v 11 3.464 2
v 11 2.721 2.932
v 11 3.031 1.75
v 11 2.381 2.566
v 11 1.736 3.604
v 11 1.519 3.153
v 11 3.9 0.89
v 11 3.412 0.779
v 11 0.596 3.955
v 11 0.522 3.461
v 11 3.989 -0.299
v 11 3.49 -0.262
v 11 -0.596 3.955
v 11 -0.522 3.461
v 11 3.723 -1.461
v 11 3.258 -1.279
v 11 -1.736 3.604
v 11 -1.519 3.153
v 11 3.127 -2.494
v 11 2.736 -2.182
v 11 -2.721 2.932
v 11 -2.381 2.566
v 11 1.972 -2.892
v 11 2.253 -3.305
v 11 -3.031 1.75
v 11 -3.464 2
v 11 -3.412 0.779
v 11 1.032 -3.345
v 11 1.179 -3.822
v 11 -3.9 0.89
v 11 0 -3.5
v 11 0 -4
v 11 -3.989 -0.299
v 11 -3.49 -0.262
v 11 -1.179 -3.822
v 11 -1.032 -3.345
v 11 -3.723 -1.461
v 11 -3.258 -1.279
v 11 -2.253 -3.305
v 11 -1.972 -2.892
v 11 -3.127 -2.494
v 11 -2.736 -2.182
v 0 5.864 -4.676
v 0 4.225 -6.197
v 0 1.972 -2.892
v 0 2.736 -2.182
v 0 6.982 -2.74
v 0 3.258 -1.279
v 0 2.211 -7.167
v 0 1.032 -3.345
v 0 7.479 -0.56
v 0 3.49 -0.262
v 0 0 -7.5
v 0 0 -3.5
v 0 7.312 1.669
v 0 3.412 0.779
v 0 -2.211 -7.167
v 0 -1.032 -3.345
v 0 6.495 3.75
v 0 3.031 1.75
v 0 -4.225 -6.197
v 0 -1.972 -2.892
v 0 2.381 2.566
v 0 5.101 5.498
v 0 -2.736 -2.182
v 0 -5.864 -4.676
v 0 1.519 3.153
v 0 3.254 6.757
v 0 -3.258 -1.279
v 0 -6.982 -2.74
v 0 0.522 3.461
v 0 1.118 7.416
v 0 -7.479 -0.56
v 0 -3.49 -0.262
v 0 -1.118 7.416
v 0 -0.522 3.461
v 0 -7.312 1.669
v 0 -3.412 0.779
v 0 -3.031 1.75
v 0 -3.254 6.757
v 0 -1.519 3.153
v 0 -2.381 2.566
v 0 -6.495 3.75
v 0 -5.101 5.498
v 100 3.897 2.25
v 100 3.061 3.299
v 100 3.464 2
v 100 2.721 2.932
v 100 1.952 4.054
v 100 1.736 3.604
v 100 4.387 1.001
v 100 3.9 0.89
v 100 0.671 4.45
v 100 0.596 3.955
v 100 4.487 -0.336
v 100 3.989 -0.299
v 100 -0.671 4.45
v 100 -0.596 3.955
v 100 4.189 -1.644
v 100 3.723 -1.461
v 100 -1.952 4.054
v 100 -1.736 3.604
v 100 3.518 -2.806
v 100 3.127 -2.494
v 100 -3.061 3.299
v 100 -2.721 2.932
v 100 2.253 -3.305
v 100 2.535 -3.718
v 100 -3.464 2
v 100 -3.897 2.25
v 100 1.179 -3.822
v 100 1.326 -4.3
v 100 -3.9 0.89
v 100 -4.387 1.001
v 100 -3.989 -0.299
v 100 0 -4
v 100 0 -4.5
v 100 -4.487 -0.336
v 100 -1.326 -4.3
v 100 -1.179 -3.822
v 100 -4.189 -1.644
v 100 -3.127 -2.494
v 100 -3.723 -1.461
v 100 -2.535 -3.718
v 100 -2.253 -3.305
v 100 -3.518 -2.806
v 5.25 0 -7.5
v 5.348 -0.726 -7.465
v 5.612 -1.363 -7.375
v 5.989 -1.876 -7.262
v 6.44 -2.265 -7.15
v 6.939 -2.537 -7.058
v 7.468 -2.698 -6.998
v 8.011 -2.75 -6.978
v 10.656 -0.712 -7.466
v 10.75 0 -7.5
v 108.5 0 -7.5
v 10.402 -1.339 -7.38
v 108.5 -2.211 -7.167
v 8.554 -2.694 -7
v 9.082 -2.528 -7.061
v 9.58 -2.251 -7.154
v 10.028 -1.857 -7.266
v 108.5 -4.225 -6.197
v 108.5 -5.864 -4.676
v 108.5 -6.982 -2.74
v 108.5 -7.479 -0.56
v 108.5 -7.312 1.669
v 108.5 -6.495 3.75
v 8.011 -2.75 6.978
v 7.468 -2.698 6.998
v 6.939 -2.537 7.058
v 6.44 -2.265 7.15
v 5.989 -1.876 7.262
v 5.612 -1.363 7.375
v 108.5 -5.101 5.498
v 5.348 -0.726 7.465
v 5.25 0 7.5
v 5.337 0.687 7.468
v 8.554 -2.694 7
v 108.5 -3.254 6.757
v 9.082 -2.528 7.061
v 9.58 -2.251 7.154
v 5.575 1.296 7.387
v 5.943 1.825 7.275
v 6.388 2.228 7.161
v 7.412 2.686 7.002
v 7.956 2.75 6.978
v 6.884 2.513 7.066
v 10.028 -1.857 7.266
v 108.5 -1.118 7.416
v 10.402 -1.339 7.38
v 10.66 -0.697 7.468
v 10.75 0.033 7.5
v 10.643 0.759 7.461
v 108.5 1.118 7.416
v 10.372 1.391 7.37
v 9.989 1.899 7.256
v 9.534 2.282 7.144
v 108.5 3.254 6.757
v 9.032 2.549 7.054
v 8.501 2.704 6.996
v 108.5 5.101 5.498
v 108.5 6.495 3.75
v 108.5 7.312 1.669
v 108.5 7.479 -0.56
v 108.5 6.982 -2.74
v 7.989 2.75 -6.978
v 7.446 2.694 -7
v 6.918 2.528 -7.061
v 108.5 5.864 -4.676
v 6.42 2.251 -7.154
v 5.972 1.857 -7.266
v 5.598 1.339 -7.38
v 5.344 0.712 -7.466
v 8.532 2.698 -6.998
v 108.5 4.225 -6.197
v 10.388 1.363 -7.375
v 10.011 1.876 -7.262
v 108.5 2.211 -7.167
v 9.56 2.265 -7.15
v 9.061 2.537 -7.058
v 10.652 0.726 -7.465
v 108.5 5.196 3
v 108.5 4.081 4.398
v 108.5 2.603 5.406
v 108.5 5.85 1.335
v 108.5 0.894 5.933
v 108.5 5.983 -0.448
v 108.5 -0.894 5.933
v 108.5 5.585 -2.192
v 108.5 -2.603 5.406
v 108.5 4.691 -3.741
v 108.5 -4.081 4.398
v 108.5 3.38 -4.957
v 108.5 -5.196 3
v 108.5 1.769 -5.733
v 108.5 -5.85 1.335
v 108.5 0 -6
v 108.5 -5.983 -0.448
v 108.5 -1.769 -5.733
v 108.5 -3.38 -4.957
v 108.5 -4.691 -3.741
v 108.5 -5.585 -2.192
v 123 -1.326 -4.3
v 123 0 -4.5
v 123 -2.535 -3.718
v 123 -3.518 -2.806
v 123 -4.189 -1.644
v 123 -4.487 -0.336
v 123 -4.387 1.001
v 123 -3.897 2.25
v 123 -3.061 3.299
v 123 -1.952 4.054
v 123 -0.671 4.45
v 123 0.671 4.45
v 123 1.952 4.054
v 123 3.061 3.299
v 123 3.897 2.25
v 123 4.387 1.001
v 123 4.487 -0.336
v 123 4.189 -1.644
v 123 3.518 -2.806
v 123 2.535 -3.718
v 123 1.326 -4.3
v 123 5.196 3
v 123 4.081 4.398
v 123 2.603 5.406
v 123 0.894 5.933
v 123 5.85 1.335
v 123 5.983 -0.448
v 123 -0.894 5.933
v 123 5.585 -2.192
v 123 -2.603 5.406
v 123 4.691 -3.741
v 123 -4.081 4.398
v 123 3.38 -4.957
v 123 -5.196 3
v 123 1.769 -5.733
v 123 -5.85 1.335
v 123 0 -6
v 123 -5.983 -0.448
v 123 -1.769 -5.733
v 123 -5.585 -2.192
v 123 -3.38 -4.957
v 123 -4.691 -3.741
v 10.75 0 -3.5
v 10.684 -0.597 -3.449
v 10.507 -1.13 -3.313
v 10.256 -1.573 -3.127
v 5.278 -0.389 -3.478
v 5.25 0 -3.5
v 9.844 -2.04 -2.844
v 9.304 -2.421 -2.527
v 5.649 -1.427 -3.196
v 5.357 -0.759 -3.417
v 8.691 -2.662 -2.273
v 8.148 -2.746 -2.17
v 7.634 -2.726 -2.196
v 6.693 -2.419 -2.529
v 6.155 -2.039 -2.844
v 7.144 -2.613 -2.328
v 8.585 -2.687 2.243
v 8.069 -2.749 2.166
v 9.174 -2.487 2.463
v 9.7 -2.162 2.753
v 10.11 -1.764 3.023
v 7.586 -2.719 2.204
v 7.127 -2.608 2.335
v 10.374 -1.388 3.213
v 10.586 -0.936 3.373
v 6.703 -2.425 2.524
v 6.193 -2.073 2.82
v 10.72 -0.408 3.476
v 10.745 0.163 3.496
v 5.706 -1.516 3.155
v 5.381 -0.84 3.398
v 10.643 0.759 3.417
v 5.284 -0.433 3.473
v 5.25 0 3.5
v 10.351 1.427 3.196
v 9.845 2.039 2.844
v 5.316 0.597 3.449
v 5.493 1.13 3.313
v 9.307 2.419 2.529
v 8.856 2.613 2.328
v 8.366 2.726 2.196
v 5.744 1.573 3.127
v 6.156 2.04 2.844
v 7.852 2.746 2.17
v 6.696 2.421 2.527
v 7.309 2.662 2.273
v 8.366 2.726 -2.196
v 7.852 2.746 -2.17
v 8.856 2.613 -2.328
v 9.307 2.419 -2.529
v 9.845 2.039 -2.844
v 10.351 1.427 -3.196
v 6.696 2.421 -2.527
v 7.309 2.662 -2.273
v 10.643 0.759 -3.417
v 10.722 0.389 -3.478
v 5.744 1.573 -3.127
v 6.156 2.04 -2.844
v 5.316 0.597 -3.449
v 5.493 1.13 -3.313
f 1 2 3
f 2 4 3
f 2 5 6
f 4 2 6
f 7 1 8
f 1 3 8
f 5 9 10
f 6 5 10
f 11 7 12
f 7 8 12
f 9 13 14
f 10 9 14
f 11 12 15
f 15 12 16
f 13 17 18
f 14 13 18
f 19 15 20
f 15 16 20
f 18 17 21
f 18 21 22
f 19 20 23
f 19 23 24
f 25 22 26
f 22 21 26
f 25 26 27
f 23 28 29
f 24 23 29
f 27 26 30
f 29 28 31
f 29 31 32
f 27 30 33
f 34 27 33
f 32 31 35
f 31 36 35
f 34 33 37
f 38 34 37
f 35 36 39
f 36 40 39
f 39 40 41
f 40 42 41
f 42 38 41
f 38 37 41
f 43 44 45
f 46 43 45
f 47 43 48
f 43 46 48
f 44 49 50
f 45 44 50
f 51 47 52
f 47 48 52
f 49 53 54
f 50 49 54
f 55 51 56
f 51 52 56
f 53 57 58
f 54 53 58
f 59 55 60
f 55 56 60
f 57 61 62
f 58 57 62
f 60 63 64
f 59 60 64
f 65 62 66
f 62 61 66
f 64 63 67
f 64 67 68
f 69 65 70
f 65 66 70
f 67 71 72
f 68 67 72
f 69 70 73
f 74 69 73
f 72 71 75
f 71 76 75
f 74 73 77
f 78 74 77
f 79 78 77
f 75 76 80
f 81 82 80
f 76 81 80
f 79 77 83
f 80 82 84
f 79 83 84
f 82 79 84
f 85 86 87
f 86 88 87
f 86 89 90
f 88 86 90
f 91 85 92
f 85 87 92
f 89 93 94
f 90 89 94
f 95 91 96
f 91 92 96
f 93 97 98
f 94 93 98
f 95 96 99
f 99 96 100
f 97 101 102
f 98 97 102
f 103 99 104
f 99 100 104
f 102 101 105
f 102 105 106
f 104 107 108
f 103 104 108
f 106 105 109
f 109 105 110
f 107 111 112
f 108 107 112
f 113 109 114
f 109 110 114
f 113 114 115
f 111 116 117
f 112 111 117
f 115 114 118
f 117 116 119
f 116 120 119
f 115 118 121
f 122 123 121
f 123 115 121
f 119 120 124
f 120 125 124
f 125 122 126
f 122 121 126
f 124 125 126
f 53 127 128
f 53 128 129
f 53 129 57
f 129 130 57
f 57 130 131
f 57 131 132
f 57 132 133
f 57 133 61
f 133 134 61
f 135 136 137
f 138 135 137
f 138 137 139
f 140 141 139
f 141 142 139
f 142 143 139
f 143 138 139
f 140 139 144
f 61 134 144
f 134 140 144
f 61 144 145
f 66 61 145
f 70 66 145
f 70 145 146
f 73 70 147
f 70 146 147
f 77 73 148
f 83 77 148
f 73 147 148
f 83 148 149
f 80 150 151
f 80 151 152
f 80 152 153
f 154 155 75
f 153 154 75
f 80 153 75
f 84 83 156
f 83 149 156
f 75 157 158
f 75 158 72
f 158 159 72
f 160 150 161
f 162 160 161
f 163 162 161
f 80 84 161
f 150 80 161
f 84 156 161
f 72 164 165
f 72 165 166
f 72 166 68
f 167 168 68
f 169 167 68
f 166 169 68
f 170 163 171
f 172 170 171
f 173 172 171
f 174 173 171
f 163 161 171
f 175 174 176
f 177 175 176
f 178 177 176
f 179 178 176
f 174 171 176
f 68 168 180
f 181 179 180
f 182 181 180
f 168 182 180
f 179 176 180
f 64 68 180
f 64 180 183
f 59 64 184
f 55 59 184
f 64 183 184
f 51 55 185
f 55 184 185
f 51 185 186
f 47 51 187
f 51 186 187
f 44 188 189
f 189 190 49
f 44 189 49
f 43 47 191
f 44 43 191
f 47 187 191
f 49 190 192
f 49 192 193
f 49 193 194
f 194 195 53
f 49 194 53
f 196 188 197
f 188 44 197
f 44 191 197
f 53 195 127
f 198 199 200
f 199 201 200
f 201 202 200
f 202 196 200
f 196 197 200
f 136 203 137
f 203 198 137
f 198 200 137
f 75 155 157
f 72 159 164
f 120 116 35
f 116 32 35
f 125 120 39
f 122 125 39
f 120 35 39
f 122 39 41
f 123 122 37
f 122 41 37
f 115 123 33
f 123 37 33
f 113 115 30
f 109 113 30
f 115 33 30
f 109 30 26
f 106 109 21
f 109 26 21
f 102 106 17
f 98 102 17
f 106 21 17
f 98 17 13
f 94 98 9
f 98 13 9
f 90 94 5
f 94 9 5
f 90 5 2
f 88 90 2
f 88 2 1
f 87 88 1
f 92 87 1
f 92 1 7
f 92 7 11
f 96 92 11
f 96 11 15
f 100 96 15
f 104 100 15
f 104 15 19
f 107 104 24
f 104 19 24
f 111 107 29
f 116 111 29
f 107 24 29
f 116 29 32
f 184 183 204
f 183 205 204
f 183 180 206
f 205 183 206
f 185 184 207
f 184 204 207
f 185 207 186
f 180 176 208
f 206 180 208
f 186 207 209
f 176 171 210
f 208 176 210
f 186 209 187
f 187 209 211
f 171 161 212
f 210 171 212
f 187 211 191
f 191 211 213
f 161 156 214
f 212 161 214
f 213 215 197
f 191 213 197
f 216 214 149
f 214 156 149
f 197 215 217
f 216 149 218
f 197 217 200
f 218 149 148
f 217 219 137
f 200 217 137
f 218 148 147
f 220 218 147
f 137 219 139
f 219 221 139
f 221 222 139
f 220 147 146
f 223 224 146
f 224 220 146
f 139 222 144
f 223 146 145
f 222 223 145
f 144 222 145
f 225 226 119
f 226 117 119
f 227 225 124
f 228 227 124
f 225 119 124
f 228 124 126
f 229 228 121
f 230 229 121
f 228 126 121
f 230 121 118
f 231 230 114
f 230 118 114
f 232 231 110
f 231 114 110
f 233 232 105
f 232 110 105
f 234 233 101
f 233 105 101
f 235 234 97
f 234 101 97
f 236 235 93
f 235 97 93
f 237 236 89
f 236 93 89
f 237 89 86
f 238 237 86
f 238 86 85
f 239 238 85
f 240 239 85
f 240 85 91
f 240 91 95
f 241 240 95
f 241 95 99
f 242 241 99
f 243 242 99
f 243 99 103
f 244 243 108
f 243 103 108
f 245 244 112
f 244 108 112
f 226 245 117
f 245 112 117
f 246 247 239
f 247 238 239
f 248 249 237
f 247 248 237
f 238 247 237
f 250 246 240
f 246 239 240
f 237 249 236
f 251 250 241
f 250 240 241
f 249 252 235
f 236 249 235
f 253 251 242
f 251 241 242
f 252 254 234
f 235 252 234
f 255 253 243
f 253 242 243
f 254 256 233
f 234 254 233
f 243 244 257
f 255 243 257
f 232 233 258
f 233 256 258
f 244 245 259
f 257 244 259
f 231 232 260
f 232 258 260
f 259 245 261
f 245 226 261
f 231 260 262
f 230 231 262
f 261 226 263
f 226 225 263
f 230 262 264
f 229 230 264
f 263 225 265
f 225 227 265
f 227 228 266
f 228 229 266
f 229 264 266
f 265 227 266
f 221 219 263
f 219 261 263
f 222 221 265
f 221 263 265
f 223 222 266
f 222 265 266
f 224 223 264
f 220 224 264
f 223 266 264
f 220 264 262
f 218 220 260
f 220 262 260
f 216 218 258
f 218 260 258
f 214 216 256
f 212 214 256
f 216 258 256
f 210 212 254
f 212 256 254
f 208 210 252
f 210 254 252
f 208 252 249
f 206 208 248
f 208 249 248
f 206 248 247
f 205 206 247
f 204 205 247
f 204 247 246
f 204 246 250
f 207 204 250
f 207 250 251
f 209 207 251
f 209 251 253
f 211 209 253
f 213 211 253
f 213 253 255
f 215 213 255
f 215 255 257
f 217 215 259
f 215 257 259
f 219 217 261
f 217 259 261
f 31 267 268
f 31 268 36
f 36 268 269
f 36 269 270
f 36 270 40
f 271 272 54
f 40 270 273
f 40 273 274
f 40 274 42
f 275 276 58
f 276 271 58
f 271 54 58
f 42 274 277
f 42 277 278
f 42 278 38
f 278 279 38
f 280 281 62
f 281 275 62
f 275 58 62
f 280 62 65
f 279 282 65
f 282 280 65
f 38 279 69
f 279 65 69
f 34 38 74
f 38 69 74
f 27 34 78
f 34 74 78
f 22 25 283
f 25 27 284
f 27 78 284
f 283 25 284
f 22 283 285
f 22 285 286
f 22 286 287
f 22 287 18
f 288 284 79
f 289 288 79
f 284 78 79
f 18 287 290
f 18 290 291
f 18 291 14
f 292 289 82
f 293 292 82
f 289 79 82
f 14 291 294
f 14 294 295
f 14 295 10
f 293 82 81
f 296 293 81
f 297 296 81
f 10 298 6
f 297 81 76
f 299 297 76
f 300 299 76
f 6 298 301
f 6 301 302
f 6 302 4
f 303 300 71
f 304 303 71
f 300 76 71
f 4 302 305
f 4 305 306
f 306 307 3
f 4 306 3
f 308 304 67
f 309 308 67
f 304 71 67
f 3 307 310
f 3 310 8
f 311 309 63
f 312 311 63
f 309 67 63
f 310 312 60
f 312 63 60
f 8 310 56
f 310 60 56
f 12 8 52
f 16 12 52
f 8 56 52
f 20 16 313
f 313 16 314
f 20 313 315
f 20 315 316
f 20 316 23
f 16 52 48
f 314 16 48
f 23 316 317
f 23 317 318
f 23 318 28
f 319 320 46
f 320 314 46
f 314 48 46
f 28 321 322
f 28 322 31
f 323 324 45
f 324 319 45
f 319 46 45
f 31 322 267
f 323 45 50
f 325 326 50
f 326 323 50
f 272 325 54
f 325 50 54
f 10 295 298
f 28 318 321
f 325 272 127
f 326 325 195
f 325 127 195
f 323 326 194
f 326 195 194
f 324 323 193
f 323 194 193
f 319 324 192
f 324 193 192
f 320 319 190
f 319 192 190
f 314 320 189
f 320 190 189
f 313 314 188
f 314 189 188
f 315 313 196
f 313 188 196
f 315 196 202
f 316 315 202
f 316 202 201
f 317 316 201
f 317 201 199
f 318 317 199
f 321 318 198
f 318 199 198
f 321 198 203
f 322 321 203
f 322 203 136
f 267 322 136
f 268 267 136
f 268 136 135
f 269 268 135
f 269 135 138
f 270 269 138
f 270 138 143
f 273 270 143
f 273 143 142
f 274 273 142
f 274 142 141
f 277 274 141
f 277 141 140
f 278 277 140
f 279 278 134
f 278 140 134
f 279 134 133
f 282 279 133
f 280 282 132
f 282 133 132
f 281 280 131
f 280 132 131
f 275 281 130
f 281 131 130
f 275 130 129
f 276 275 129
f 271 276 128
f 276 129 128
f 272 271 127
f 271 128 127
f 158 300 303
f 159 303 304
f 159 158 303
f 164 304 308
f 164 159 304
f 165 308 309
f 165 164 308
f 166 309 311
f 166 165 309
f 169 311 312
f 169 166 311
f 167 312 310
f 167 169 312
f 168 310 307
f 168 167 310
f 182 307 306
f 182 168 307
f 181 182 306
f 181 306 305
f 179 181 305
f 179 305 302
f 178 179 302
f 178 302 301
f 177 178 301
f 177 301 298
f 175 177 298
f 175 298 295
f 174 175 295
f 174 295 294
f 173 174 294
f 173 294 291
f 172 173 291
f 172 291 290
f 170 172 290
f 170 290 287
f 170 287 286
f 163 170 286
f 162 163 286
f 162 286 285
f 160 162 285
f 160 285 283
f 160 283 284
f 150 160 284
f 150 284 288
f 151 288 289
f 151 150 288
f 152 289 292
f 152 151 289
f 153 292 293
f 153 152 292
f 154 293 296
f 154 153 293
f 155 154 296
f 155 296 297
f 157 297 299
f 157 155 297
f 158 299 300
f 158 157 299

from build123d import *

# Parameters (mm, degrees)
FURO_DE_DI_METRO_5_5_5_5_1_REACH  = 126.138
FURO_DE_DI_METRO_5_5_5_5_1_BORE_R = 2.75


with BuildPart() as part:
    # Esboço1 → Revolução1 (revolve)
    with BuildSketch(Plane.XY, mode=Mode.PRIVATE) as revolu_o1_sk:
        Polygon((0, 3.5), (0, 7.5), (108.5, 7.5), (108.5, 6), (123, 6), (123, 4.5), (100, 4.5), (100, 4), (11, 4), (11, 3.5), align=None)
    revolve(revolu_o1_sk.sketch.rotate(Axis((123, 0, 0), (-1, 0, 0)), 90), axis=Axis((123, 0, 0), (-1, 0, 0)))

    # Furo de diâmetro Ø5.5 (5.5)1 bore → Furo de diâmetro Ø5.5 (5.5)1 (cut, up to next)
    with BuildSketch(Plane(origin=(0, 0, -7.5), x_dir=(-1, 0, 0), z_dir=(0, 0, -1)), mode=Mode.PRIVATE) as furo_de_di_metro_5_5_5_5_1_sk1:
        with Locations((-8, 0)):
            Circle(FURO_DE_DI_METRO_5_5_5_5_1_BORE_R)
    furo_de_di_metro_5_5_5_5_1_tool1 = extrude(furo_de_di_metro_5_5_5_5_1_sk1.sketch, amount=-FURO_DE_DI_METRO_5_5_5_5_1_REACH, mode=Mode.PRIVATE) & part.part
    furo_de_di_metro_5_5_5_5_1 = furo_de_di_metro_5_5_5_5_1_tool1.solids().sort_by_distance((8, 0, -7.5))[0]
    add(furo_de_di_metro_5_5_5_5_1, mode=Mode.SUBTRACT)

    # Espelhar1: Furo de diâmetro Ø5.5 (5.5)1 across plane
    add(furo_de_di_metro_5_5_5_5_1.mirror(Plane.XY), mode=Mode.SUBTRACT)


solid = part.part
